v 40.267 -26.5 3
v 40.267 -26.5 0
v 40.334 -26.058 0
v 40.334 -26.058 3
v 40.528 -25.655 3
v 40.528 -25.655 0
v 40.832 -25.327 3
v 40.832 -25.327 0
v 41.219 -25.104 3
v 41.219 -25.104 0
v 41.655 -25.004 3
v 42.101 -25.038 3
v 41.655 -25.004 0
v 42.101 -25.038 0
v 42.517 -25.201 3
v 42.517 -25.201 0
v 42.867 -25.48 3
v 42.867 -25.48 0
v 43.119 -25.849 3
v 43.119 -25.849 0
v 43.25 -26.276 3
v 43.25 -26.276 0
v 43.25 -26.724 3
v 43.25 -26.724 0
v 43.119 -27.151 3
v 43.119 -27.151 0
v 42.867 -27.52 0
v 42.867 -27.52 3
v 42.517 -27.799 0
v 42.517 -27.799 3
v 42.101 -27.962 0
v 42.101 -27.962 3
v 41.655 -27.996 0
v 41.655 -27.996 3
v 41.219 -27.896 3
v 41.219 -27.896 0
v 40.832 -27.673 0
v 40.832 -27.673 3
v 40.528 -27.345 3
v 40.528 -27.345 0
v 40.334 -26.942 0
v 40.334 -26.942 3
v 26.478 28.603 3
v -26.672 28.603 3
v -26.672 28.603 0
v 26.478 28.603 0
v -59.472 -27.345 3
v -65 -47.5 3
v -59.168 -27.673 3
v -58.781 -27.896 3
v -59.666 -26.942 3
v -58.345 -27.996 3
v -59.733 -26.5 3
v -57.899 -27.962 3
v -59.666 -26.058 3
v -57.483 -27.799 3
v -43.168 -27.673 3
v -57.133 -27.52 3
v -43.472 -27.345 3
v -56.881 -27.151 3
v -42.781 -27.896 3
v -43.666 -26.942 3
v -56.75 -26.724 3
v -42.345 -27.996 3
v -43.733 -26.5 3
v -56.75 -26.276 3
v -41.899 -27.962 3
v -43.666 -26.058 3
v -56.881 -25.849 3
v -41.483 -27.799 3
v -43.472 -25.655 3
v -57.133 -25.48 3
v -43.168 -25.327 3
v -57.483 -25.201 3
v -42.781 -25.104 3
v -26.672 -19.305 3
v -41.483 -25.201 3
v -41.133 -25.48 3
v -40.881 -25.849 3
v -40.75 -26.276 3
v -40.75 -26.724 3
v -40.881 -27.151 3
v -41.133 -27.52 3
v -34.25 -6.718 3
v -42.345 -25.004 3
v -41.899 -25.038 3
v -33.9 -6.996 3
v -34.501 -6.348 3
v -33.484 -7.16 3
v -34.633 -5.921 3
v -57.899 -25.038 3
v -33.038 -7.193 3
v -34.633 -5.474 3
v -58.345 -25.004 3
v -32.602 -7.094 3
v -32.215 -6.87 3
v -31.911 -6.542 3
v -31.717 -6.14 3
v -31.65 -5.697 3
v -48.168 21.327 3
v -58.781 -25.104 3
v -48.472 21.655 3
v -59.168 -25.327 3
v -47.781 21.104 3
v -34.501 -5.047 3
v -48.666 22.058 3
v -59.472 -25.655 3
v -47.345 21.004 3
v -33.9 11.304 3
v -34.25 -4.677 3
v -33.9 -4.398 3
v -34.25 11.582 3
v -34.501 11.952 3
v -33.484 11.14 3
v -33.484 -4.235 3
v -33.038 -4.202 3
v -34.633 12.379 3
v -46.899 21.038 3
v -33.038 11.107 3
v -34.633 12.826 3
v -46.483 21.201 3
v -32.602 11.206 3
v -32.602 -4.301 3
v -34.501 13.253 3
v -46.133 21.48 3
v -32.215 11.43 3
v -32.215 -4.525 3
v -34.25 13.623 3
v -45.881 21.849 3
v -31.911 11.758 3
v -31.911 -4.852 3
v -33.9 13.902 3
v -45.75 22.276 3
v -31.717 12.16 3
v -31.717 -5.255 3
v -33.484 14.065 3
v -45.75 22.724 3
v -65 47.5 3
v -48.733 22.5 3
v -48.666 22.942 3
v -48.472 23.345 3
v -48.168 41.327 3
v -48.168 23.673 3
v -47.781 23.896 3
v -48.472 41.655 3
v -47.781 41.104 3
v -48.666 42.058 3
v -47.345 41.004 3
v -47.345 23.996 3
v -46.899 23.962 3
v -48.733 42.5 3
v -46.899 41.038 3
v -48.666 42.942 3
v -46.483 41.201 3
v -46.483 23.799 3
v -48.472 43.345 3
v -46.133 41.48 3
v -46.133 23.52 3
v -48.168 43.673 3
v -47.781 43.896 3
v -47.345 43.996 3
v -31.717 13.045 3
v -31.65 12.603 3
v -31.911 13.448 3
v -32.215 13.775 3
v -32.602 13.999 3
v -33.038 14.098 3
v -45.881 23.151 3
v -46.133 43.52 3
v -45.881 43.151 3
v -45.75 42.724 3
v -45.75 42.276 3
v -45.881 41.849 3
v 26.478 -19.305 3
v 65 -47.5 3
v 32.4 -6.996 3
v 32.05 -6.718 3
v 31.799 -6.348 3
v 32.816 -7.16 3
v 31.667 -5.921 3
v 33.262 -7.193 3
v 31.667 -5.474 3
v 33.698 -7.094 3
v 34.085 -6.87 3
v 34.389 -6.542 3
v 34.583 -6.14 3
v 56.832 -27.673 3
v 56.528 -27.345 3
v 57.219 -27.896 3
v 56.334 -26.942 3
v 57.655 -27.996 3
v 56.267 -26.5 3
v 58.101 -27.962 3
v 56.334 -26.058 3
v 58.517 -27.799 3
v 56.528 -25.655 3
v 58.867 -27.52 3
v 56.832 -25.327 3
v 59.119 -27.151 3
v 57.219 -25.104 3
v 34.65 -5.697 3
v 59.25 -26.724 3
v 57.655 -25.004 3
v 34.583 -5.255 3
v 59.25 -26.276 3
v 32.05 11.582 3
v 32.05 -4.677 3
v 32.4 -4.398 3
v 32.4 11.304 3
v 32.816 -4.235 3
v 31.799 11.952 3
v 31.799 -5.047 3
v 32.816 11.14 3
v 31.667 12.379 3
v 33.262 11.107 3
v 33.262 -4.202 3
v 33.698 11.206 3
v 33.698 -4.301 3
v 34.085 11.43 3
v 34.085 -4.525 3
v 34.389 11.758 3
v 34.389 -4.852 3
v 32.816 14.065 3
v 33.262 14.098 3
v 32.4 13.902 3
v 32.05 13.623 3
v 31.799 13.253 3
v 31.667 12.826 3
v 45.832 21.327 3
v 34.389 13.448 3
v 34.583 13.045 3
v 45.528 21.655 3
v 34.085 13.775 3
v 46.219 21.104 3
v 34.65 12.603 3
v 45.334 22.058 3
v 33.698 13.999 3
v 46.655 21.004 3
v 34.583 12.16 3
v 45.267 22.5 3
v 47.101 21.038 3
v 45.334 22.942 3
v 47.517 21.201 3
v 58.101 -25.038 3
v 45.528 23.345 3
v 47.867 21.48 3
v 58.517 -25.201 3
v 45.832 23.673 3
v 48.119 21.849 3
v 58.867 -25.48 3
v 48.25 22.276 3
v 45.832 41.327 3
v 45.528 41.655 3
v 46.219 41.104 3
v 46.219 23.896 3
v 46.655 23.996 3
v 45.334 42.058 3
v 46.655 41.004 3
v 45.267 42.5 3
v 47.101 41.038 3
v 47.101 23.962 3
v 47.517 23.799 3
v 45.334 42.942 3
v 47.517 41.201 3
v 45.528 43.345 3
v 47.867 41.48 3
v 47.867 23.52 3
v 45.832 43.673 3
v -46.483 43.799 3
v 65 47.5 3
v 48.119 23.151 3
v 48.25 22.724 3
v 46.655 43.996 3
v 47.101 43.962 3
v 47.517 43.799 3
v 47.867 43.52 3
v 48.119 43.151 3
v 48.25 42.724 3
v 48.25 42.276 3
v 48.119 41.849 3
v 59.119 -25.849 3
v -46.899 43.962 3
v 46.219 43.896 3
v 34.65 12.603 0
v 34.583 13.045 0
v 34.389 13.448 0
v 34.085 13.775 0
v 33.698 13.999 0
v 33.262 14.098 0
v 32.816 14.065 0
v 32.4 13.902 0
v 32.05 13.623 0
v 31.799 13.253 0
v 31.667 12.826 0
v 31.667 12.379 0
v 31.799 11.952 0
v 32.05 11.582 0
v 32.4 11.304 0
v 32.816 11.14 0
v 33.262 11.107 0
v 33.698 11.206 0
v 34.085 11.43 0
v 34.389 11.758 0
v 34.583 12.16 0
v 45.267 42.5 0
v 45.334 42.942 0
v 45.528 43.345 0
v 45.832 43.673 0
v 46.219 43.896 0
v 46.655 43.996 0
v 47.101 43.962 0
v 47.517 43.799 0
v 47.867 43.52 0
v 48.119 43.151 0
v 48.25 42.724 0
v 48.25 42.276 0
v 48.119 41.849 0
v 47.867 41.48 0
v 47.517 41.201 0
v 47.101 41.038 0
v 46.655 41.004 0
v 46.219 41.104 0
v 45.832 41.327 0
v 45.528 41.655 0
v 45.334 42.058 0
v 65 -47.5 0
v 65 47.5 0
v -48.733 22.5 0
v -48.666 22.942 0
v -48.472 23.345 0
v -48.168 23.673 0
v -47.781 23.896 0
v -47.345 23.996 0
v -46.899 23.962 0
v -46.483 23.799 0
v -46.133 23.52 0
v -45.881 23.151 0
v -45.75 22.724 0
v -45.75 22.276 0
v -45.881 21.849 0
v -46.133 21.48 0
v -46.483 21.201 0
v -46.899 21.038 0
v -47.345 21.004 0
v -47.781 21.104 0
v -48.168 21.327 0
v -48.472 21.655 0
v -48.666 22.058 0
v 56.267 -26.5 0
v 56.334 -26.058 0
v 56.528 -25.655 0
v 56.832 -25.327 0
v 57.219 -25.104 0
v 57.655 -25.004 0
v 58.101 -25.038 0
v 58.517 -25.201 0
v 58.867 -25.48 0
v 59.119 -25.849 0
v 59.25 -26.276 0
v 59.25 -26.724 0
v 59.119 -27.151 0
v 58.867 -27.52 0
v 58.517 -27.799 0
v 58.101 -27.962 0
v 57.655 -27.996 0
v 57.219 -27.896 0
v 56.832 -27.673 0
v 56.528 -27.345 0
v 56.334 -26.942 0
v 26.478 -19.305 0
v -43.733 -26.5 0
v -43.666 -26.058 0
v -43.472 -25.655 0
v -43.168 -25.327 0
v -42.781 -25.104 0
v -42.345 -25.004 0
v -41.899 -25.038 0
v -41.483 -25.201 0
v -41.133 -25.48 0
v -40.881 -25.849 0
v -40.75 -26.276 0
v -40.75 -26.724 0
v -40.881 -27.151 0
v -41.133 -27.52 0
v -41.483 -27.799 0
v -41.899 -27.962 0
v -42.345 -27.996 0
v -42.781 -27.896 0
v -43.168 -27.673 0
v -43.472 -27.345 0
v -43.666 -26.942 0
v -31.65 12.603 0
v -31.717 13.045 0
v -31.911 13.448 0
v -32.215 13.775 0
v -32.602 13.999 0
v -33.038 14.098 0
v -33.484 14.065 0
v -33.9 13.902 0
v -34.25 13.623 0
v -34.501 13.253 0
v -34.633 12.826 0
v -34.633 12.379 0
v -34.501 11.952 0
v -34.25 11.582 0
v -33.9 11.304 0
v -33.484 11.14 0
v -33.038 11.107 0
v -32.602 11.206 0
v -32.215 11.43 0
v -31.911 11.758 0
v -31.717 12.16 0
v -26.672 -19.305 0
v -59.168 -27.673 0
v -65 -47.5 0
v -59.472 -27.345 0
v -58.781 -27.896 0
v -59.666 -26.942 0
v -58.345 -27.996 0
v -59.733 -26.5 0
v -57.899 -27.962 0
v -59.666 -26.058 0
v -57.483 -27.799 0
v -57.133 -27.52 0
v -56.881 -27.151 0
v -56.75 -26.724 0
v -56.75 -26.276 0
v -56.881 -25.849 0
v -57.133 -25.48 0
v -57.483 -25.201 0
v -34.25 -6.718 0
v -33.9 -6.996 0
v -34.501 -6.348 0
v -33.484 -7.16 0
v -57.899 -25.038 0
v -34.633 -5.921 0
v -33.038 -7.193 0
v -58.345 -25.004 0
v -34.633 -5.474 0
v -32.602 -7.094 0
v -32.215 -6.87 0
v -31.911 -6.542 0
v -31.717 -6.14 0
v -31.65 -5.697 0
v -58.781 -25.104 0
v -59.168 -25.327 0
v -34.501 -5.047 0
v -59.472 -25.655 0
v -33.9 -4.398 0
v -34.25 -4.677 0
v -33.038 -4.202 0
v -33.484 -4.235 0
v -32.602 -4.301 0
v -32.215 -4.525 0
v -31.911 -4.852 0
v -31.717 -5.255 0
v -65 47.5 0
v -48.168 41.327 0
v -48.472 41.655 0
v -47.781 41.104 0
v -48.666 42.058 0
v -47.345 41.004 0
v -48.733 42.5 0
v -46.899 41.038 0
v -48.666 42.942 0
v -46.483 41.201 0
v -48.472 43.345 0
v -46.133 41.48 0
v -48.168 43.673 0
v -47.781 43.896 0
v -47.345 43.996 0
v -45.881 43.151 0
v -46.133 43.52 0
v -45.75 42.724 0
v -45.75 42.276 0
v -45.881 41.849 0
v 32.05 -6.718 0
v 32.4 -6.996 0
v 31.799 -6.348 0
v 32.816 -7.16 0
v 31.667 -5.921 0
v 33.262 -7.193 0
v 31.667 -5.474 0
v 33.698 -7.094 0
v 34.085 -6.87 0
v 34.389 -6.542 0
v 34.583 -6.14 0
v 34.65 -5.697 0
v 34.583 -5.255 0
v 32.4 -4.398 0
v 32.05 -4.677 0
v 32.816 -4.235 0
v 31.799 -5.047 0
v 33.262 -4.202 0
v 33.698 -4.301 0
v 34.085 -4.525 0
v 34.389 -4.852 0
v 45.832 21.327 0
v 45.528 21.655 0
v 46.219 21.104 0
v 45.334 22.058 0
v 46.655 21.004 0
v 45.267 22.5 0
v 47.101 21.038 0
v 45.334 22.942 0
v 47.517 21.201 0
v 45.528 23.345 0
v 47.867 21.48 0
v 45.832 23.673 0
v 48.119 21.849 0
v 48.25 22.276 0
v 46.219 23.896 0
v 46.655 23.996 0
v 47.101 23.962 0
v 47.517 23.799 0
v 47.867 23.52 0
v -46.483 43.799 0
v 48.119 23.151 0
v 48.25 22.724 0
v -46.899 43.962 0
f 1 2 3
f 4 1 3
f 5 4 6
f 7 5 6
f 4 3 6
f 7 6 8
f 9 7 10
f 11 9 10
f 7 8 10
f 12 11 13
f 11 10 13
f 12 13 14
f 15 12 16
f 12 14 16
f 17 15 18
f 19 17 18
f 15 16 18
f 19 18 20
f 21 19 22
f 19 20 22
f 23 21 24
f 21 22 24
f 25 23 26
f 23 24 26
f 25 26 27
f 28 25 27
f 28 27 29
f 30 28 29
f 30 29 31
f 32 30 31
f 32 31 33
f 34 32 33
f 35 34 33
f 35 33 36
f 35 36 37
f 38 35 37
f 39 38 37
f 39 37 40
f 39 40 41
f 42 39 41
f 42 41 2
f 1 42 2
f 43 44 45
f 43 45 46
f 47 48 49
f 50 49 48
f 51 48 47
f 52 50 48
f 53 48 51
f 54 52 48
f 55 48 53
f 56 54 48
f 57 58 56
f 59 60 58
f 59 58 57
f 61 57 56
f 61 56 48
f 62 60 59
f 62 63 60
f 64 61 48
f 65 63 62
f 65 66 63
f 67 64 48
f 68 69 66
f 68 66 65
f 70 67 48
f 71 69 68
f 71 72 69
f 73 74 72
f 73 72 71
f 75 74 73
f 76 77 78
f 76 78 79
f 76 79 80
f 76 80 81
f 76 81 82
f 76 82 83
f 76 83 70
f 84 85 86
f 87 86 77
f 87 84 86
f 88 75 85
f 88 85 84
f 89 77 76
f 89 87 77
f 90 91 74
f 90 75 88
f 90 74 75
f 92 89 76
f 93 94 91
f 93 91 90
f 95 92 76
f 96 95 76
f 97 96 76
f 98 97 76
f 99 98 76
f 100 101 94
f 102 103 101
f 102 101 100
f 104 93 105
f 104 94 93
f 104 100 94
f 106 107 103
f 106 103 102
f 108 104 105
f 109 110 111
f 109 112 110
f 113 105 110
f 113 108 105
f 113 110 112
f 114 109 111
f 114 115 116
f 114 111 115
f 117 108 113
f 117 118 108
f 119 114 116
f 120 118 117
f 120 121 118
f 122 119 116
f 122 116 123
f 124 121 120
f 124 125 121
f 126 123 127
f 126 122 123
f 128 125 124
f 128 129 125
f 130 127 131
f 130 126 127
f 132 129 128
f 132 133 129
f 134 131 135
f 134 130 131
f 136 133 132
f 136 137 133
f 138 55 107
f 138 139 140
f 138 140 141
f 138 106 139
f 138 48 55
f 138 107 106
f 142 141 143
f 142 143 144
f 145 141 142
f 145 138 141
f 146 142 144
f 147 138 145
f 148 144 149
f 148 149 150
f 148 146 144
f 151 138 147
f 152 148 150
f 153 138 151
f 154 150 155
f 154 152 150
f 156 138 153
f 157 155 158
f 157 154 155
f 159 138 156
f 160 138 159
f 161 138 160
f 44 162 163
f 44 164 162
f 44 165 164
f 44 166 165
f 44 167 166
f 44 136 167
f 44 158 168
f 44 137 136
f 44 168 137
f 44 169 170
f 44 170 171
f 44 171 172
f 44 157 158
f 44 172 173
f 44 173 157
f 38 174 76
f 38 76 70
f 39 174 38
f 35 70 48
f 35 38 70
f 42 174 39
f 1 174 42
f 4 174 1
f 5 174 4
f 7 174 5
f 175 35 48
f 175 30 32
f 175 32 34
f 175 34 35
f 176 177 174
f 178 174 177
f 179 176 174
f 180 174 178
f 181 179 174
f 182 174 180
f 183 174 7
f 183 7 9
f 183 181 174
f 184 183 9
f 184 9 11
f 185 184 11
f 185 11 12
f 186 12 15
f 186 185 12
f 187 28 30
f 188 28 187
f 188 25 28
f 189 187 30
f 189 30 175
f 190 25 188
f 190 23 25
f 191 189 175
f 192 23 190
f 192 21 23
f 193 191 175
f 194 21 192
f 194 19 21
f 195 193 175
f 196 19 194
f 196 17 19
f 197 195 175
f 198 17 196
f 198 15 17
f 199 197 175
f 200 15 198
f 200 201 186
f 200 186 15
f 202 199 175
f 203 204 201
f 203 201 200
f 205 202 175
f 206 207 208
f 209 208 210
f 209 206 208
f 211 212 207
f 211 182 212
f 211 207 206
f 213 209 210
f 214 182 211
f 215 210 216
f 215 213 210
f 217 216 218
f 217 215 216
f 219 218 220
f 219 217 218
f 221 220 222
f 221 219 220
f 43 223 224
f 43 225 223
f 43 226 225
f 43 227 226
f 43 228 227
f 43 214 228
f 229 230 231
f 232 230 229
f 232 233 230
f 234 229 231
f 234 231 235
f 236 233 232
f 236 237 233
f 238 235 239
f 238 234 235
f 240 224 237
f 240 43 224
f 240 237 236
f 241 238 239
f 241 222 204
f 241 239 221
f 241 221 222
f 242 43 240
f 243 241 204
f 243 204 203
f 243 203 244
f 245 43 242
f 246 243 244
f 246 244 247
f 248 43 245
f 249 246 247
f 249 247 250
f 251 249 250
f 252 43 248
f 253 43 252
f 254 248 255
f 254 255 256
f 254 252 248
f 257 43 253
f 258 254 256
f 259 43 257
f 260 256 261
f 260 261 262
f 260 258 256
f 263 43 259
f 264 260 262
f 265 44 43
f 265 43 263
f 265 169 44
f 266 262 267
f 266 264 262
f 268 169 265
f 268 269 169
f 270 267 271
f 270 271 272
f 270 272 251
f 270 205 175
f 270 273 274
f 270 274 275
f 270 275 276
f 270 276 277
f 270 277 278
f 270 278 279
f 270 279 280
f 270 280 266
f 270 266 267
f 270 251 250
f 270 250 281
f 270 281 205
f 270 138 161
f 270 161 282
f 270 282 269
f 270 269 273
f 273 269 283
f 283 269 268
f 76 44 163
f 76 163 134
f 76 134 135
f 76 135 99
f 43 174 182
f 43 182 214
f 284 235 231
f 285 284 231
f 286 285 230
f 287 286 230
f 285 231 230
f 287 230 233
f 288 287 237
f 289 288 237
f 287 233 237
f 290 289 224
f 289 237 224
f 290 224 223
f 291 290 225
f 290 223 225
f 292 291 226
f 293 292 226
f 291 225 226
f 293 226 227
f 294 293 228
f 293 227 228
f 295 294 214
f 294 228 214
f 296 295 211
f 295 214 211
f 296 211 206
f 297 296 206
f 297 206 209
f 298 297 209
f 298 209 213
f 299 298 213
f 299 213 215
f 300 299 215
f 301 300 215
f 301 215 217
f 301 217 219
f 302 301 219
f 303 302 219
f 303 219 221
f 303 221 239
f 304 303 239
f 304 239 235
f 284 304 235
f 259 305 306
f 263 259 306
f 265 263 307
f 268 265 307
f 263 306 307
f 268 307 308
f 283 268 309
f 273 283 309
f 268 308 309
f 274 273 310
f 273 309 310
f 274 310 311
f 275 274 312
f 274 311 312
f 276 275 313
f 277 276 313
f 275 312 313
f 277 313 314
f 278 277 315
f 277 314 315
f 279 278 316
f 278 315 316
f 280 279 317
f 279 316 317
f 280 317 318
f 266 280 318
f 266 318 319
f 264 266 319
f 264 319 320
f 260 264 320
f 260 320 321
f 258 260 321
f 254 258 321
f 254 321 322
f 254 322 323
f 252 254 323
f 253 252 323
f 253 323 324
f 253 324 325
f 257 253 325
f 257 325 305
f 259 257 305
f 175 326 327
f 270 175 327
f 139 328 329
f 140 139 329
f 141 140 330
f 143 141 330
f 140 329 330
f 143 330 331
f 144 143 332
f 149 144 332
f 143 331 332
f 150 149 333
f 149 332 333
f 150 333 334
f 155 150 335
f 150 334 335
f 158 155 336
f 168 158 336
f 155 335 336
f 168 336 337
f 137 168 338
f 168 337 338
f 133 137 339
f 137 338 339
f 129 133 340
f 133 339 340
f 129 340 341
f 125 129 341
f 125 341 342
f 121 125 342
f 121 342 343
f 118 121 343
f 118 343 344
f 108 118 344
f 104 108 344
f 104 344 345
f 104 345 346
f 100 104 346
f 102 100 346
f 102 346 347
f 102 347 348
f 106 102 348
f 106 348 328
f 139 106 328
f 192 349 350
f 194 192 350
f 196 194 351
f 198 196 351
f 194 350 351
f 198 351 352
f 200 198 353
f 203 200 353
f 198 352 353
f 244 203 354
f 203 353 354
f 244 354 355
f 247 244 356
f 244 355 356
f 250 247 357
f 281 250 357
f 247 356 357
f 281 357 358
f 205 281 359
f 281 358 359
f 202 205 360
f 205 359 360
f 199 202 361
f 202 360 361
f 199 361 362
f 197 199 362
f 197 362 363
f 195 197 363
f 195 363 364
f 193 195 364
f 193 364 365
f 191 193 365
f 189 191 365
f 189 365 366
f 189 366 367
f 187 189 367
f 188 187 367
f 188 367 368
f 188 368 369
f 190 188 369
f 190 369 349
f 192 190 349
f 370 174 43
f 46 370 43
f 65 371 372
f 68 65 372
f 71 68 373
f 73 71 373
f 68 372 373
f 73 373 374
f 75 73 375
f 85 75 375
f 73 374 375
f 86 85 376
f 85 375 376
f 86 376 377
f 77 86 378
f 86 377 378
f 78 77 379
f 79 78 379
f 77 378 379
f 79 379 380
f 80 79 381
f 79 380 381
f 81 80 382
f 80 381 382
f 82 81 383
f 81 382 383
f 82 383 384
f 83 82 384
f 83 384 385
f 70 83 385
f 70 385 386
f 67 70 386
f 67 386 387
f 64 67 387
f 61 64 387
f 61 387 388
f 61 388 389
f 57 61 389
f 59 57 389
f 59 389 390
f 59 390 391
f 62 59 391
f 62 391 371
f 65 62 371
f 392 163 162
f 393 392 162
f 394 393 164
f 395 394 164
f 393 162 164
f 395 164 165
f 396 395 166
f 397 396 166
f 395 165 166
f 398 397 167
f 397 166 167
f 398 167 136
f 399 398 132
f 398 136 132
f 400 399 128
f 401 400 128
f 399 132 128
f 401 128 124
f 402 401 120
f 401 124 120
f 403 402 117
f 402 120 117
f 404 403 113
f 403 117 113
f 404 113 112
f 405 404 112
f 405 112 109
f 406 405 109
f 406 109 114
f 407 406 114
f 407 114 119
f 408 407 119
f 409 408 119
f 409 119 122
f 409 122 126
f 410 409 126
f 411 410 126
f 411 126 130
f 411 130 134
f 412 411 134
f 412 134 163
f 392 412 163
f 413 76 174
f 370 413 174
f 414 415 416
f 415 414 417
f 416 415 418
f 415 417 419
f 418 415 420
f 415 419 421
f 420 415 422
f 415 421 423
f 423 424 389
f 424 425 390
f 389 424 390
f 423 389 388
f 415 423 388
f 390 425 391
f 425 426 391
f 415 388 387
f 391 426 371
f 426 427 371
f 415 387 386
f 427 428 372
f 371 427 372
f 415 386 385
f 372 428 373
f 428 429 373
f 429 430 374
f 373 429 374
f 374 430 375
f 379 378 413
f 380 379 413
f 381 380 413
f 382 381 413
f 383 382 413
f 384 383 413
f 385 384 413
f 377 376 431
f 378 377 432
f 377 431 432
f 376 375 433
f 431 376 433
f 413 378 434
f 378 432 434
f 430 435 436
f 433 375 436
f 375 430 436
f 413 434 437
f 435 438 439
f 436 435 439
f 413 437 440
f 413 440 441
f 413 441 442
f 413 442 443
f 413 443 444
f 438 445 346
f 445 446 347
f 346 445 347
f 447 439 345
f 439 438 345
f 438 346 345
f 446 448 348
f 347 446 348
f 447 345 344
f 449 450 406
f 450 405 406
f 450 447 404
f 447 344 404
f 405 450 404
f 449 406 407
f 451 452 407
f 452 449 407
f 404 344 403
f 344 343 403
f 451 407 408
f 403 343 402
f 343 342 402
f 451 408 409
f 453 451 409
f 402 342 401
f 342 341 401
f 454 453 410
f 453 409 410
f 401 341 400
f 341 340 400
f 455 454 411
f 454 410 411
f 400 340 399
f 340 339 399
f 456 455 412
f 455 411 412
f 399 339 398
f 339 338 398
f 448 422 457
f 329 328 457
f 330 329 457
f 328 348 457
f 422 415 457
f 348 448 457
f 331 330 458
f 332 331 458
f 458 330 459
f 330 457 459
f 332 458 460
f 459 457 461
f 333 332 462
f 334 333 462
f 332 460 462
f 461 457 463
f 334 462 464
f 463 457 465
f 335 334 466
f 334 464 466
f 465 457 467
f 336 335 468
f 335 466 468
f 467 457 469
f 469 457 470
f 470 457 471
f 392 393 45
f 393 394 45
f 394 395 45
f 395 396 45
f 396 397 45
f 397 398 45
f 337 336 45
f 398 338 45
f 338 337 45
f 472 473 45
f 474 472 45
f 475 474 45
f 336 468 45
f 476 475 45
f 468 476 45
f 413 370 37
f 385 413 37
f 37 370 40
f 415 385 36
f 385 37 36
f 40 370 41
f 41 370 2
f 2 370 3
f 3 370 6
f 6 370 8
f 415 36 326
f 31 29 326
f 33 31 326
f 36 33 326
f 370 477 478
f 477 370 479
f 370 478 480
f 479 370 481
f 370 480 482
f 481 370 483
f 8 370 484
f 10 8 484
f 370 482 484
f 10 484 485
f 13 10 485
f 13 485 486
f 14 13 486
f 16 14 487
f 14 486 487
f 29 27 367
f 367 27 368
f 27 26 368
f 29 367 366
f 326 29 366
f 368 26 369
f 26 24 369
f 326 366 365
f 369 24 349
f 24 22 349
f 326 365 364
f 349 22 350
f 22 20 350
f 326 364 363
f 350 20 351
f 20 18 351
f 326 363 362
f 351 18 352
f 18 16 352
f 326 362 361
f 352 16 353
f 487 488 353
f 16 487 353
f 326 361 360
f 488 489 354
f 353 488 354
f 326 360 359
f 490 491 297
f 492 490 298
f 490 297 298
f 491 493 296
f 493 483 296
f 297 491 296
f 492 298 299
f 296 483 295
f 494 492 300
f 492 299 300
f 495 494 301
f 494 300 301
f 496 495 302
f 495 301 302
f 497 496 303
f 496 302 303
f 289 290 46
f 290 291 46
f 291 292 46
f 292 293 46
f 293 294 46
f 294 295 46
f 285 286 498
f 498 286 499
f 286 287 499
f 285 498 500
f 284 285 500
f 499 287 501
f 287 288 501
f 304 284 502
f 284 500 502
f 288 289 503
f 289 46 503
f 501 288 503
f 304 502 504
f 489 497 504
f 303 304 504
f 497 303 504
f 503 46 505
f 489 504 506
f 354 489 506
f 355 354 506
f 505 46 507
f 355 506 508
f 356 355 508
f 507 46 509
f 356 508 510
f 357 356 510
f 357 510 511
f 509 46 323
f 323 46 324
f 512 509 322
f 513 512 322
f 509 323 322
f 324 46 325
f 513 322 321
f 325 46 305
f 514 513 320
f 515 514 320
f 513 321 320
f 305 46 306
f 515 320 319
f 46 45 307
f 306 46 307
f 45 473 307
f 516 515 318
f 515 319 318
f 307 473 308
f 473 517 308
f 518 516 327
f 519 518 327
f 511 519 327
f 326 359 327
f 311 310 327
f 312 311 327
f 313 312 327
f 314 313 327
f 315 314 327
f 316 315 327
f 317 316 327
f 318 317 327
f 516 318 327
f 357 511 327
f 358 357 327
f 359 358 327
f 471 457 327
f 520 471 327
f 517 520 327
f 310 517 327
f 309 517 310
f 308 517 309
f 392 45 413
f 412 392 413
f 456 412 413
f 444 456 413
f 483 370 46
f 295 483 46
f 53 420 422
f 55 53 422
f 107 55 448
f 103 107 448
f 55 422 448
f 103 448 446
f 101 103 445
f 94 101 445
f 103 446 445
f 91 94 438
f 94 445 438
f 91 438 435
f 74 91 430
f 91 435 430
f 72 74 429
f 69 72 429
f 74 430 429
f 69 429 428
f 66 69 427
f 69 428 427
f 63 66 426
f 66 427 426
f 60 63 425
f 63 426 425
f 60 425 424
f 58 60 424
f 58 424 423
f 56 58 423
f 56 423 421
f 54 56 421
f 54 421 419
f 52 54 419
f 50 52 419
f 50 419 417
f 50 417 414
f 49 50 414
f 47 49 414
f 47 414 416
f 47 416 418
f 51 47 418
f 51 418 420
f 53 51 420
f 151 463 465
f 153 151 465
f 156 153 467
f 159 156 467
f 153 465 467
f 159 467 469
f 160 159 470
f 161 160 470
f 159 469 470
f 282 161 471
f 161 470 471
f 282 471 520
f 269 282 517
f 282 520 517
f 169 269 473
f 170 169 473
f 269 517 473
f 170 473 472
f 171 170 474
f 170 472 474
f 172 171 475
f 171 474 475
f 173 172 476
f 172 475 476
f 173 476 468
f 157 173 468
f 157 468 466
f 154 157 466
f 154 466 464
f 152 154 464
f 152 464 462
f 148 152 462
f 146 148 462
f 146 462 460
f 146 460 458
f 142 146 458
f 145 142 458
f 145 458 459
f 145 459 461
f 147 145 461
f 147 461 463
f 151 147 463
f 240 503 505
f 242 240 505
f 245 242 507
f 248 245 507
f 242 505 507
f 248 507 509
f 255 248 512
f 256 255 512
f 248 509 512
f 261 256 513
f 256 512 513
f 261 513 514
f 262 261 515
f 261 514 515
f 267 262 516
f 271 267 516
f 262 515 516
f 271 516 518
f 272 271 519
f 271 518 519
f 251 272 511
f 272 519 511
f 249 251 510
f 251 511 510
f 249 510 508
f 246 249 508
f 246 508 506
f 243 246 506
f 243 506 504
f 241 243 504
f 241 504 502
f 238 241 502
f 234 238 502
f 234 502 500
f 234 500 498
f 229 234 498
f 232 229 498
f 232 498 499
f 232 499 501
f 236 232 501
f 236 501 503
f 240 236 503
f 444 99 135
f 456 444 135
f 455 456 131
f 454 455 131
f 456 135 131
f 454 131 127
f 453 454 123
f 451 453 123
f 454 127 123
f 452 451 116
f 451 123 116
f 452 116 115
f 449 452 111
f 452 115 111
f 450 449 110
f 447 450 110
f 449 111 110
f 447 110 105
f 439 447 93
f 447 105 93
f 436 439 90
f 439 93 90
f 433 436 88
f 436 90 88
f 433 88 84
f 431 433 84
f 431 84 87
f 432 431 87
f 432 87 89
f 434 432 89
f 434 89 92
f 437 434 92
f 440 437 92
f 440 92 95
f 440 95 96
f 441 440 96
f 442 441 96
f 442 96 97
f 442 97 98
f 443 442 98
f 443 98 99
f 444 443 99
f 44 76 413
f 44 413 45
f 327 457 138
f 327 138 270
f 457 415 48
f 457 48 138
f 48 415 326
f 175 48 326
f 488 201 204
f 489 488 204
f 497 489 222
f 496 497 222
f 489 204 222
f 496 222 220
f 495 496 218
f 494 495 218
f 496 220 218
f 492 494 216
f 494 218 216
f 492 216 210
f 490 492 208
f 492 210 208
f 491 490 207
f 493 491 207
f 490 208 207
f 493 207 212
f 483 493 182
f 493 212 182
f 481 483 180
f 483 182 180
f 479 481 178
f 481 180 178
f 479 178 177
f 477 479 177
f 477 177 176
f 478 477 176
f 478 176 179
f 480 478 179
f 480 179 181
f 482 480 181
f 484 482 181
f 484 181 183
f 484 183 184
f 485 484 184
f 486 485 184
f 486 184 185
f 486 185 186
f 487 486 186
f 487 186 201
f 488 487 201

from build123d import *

# Parameters (mm, degrees)
SKETCH_1_W           = 130
SKETCH_1_H           = 95
EXTRUDE_1_DEPTH      = 3
SKETCH_3_R           = 1.5
CUT_EXTRUDE_2_DEPTH  = 10
SKETCH_4_R           = 1.5
CUT_EXTRUDE_3_DEPTH  = 10
SKETCH_15_R          = 12.75
CUT_EXTRUDE_8_DEPTH  = 10
SKETCH_16_R          = 1.25
CUT_EXTRUDE_9_DEPTH  = 10
SKETCH_18_R          = 1.5
SKETCH_18_W          = 53.14997645
SKETCH_18_H          = 47.90789948
CUT_EXTRUDE_10_DEPTH = 10


with BuildPart() as part:
    # 草图1 → 凸台-拉伸1 (new body)
    with BuildSketch(Plane.XY):
        Rectangle(SKETCH_1_W, SKETCH_1_H)
    extrude(amount=EXTRUDE_1_DEPTH)

    # 草图3 → 切除-拉伸2 (cut)
    with BuildSketch(Plane(origin=(0, 0, 0), x_dir=(-1, 0, 0), z_dir=(0, 0, -1))):
        with Locations((-57.767112616, -26.5)):
            Circle(SKETCH_3_R)
        with Locations((-41.767112616, -26.5)):
            Circle(SKETCH_3_R)
        with Locations((42.232887384, -26.5)):
            Circle(SKETCH_3_R)
        with Locations((58.232887384, -26.5)):
            Circle(SKETCH_3_R)
    extrude(amount=-CUT_EXTRUDE_2_DEPTH, mode=Mode.SUBTRACT)

    # 草图4 → 切除-拉伸3 (cut)
    with BuildSketch(Plane(origin=(0, 0, 0), x_dir=(-1, 0, 0), z_dir=(0, 0, -1))):
        with Locations((-46.767112616, 42.5)):
            Circle(SKETCH_4_R)
        with Locations((-46.767112616, 22.5)):
            Circle(SKETCH_4_R)
        with Locations((47.232887384, 42.5)):
            Circle(SKETCH_4_R)
        with Locations((47.232887384, 22.5)):
            Circle(SKETCH_4_R)
    extrude(amount=-CUT_EXTRUDE_3_DEPTH, mode=Mode.SUBTRACT)

    # 草图15 → 切除-拉伸8 (cut)
    with BuildSketch(Plane(origin=(0, 0, 0), x_dir=(-1, 0, 0), z_dir=(0, 0, -1))):
        with Locations((0, 7.452587902)):
            Circle(SKETCH_15_R)
    extrude(amount=-CUT_EXTRUDE_8_DEPTH, mode=Mode.SUBTRACT)

    # 草图16 → 切除-拉伸9 (cut)
    with BuildSketch(Plane(origin=(0, 0, 0), x_dir=(-1, 0, 0), z_dir=(0, 0, -1))):
        with Locations((-15.5, 22.952587902)):
            Circle(SKETCH_16_R)
        with Locations((15.5, 22.952587902)):
            Circle(SKETCH_16_R)
        with Locations((15.5, -8.047412098)):
            Circle(SKETCH_16_R)
        with Locations((-15.5, -8.047412098)):
            Circle(SKETCH_16_R)
    extrude(amount=-CUT_EXTRUDE_9_DEPTH, mode=Mode.SUBTRACT)

    # 草图18 → 切除-拉伸10 (cut)
    with BuildSketch(Plane.XY.offset(3)):
        with Locations((-33.15, 12.602587902)):
            Circle(SKETCH_18_R)
        with Locations((-33.15, -5.697412098)):
            Circle(SKETCH_18_R)
        with Locations((33.15, 12.602587902)):
            Circle(SKETCH_18_R)
        with Locations((33.15, -5.697412098)):
            Circle(SKETCH_18_R)
        with Locations((-0.096851142, 4.648638162)):
            Rectangle(SKETCH_18_W, SKETCH_18_H)
    extrude(amount=-CUT_EXTRUDE_10_DEPTH, mode=Mode.SUBTRACT)


solid = part.part
